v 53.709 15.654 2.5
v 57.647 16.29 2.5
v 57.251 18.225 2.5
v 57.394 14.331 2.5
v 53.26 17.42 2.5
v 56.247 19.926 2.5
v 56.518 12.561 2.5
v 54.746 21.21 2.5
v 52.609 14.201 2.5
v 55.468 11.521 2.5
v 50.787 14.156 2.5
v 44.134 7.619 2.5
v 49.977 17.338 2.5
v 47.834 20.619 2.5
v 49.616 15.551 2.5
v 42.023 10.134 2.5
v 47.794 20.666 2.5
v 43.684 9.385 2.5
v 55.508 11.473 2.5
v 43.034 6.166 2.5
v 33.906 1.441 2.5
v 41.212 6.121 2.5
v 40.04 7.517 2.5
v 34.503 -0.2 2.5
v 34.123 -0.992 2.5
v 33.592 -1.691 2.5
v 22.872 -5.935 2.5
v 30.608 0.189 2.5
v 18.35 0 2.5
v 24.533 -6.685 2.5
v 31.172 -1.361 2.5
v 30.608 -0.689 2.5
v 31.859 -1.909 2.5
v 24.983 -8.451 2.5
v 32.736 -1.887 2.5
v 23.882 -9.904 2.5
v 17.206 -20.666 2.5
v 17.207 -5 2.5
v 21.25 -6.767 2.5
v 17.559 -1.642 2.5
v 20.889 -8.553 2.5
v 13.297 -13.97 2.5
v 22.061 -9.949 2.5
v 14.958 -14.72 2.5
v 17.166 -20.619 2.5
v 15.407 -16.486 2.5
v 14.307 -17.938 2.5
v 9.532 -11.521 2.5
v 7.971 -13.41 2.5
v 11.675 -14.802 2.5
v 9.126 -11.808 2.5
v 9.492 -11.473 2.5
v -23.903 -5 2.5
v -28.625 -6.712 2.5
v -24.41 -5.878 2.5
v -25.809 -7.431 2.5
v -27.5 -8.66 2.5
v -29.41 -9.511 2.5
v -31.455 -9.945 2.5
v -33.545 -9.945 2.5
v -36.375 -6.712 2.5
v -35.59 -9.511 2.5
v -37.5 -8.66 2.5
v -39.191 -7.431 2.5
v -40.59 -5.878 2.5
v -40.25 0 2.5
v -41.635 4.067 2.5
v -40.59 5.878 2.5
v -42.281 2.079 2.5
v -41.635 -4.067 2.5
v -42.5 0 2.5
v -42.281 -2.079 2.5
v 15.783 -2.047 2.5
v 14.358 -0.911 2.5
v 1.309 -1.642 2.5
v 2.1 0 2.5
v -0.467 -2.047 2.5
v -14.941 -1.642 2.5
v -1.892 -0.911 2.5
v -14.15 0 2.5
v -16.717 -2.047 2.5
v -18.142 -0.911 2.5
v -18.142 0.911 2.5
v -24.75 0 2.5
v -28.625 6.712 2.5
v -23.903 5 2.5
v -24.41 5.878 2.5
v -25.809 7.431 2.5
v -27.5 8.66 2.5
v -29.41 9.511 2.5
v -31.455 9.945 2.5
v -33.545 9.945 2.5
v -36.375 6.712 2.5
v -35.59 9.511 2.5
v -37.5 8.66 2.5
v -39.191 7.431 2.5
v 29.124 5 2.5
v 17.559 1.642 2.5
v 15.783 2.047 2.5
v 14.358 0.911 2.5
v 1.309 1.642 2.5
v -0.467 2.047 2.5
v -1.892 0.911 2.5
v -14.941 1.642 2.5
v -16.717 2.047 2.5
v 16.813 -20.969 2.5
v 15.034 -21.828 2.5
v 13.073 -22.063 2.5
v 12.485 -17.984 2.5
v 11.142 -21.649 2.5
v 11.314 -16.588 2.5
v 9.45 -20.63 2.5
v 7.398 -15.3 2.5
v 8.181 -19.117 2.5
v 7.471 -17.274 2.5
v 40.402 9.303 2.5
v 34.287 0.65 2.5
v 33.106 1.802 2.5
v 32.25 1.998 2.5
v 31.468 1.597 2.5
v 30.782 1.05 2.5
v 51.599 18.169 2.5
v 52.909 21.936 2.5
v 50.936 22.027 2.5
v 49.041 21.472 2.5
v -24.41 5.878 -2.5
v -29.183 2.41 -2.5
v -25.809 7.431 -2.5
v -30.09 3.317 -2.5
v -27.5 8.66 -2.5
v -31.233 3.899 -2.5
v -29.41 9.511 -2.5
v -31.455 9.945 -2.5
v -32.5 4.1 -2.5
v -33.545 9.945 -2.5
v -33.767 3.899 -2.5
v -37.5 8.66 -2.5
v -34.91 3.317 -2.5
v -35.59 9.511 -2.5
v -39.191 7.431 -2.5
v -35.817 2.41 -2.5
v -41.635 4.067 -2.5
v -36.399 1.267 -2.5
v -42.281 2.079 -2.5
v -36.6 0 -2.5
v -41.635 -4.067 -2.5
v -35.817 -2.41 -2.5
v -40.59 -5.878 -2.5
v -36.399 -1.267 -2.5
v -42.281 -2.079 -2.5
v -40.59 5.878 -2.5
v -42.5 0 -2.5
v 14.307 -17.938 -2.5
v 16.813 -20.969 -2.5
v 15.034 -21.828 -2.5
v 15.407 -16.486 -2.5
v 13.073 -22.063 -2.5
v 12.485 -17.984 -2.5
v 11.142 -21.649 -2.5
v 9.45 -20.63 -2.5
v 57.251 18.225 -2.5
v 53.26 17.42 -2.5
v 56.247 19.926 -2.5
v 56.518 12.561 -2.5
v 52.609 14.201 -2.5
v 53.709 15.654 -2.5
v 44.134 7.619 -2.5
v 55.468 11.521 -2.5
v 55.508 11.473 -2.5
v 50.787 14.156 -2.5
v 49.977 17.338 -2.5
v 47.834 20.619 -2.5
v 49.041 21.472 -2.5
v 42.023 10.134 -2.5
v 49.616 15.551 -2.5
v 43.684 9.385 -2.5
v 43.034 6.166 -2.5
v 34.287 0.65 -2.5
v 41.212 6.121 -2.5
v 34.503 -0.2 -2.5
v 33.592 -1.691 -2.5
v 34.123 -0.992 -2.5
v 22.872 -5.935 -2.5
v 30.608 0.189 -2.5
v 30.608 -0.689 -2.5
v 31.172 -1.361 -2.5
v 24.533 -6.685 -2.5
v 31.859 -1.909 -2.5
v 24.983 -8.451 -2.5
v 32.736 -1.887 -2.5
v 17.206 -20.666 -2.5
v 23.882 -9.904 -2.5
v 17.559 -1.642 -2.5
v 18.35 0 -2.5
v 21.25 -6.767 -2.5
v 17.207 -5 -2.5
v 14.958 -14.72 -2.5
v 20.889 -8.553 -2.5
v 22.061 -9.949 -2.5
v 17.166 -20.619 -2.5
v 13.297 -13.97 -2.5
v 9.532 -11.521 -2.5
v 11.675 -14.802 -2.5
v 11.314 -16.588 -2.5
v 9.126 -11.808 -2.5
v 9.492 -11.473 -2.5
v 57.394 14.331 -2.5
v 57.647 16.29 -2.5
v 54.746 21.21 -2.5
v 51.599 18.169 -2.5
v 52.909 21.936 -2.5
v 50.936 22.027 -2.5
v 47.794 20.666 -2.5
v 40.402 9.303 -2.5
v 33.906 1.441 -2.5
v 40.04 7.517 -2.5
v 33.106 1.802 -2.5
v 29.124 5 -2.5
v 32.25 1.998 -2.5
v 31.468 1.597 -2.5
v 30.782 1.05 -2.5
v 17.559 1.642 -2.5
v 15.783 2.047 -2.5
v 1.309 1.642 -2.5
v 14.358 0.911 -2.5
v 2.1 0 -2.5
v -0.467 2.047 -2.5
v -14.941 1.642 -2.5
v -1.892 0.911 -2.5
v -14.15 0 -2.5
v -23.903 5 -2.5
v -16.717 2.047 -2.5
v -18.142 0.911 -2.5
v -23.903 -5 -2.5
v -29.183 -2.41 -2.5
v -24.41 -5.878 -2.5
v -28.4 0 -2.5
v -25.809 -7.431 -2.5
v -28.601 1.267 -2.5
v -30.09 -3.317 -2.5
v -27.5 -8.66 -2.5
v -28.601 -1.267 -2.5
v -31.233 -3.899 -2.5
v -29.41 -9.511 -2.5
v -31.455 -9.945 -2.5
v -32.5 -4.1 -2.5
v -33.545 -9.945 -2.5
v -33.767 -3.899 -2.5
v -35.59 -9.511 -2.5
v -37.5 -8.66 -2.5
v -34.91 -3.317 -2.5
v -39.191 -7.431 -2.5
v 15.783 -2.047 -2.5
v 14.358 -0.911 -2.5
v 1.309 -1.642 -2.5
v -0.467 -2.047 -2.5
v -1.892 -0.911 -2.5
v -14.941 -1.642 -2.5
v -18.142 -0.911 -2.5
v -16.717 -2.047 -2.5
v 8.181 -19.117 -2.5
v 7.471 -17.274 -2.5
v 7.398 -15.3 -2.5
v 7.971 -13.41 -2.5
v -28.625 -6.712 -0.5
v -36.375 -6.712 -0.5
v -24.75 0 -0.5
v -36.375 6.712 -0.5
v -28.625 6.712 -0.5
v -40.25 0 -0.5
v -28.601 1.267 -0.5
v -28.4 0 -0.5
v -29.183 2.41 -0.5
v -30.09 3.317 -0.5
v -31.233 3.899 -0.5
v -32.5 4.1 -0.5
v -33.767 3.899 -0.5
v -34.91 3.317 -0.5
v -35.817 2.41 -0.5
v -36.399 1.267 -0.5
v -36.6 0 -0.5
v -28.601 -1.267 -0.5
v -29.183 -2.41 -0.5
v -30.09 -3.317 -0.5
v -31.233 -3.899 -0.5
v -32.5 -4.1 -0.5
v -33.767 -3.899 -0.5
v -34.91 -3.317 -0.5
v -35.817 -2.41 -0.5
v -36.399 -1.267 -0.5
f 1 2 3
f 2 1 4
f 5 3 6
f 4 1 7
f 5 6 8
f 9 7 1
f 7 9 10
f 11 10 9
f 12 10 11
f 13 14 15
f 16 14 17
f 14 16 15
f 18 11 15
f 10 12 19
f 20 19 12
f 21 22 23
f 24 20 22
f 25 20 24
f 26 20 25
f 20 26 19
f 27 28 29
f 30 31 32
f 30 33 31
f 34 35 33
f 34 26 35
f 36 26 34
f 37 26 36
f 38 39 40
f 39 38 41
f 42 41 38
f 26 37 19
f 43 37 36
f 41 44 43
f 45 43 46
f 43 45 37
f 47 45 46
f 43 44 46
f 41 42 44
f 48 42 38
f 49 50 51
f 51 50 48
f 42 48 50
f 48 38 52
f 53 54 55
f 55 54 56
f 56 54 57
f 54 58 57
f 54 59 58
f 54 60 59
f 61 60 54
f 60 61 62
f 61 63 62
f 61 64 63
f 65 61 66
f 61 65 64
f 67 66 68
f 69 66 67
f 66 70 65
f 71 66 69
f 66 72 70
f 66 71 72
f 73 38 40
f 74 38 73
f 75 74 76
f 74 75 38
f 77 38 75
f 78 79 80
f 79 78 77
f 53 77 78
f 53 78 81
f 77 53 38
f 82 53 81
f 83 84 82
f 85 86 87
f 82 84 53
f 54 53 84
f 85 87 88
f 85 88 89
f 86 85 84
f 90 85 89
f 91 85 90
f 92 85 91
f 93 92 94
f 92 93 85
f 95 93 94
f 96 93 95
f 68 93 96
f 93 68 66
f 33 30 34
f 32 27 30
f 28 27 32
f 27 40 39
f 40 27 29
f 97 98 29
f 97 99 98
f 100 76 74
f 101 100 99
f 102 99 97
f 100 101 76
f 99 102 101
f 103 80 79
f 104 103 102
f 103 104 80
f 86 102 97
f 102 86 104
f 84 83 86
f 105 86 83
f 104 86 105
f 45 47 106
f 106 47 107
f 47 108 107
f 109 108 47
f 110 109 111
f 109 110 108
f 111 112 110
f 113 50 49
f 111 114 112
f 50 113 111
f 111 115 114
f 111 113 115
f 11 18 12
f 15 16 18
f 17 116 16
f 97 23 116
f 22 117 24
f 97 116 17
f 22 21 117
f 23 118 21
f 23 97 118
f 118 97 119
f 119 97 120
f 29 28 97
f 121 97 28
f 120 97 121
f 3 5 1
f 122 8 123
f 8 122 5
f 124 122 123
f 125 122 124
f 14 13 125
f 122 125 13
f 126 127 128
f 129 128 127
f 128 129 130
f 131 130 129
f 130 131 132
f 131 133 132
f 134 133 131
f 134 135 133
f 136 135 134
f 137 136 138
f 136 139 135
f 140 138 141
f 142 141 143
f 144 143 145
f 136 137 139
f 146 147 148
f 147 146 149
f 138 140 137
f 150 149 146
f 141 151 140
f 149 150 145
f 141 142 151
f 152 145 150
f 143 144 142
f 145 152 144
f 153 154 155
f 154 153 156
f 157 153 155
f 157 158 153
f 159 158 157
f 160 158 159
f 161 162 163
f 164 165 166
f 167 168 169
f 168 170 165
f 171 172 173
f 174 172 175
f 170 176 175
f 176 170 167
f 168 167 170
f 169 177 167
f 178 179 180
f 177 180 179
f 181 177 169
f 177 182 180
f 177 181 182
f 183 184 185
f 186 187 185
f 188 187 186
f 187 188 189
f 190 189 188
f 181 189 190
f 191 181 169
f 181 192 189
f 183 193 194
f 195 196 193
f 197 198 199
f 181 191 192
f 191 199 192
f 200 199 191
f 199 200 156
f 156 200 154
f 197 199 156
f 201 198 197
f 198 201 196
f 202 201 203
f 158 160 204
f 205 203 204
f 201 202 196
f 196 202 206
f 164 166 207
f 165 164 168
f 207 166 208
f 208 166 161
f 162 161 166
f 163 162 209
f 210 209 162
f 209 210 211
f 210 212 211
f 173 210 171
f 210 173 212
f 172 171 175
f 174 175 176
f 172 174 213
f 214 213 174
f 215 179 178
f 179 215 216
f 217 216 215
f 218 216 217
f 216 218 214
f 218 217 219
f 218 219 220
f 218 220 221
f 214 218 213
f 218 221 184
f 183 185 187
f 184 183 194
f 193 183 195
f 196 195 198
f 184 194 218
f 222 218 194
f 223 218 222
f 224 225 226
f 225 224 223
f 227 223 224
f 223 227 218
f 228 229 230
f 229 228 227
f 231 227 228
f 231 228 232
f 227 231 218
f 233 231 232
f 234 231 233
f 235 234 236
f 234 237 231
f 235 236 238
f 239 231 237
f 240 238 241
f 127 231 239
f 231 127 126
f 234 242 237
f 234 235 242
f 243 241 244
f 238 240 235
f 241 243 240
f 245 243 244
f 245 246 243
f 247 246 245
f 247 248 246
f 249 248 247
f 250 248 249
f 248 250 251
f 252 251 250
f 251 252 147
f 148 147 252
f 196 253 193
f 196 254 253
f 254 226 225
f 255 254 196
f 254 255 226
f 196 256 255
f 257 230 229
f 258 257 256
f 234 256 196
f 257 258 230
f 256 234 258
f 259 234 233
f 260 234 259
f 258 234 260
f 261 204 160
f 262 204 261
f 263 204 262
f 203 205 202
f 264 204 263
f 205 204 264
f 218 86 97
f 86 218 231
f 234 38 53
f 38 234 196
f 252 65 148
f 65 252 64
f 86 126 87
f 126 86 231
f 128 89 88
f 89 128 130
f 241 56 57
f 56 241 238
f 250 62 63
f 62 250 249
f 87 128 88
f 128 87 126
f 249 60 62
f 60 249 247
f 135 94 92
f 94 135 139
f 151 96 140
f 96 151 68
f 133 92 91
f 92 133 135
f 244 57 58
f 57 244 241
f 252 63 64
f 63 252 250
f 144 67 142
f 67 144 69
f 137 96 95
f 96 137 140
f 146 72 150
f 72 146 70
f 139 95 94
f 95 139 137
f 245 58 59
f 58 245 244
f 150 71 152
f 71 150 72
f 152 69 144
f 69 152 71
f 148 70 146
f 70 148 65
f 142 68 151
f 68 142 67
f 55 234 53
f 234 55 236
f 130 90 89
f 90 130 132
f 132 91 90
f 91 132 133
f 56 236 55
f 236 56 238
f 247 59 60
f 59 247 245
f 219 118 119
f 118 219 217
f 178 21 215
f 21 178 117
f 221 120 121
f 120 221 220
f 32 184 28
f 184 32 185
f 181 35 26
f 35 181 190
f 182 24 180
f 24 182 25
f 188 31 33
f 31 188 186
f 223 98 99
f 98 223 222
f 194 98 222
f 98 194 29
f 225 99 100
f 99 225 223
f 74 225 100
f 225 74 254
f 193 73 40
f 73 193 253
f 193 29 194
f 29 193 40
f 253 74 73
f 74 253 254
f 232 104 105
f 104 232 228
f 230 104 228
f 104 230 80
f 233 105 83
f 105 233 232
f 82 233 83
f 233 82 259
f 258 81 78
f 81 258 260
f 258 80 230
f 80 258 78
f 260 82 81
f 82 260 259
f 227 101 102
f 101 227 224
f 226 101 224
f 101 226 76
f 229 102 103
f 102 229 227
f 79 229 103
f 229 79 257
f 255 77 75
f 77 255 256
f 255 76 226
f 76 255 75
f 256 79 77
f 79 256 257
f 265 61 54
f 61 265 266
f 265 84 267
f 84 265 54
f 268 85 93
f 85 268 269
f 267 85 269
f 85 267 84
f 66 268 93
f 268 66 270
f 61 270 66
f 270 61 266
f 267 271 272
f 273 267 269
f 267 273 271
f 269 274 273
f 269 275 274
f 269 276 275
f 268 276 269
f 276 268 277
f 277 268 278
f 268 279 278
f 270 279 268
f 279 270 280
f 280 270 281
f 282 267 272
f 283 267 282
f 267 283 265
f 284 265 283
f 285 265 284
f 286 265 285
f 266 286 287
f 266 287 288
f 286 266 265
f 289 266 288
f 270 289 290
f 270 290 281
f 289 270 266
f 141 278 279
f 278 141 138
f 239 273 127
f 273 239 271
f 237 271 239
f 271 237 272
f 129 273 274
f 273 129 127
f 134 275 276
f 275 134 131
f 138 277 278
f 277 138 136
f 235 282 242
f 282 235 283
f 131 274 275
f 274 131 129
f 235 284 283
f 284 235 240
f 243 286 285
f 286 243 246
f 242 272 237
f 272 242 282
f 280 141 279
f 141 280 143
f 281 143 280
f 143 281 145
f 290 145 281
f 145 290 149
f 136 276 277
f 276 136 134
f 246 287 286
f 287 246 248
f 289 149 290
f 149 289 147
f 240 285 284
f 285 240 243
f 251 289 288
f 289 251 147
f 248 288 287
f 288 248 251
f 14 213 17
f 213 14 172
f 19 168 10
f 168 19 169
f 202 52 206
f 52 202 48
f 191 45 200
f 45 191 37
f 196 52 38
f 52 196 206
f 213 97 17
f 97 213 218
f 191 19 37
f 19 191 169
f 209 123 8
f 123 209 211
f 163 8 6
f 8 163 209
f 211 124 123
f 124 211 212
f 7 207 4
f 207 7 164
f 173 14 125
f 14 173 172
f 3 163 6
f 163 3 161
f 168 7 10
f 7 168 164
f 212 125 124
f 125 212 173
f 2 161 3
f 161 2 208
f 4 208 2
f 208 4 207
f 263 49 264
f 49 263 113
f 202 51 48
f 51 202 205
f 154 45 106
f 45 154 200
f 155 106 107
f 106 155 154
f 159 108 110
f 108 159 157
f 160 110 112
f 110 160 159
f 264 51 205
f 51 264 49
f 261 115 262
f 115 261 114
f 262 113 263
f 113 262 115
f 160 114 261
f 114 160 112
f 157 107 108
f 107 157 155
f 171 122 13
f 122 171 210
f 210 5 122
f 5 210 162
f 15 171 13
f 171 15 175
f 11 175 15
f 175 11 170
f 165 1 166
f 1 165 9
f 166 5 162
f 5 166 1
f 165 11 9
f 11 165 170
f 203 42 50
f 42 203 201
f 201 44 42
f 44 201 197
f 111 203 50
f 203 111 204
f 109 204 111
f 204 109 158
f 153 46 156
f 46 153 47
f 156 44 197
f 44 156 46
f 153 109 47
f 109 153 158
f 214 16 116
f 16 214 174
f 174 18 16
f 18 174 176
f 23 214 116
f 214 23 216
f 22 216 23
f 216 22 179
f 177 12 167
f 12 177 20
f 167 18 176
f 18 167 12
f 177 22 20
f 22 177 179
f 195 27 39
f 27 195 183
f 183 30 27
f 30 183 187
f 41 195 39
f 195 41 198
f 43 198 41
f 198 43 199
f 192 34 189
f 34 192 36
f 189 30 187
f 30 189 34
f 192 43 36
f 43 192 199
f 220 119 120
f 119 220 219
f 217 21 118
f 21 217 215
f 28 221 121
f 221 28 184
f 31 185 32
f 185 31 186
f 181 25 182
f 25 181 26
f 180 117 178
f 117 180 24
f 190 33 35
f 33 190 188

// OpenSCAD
espesor_pieza=5;
ancho_pieza=10;
longitud_tensor=50;
longitud_brazo=53;
longitud_brazo_suspension=50;


longitud_brazo_diagonal=sqrt(pow(longitud_brazo,2)+pow(longitud_brazo_suspension,2));
longitud_brazo_diagonal=65;

echo (longitud_brazo_diagonal);

suspension();
//brazo_diagonal();
module suspension(){
	difference(){
		union(){
			//brazo principal HORIZONTAL
			brazo_diagonal();
			
			
			translate([longitud_brazo_diagonal/2,,0])
			rotate([0,0,40])
			brazotensor();			
			
			//placa apoyo
			//translate([(-longitud_brazo+ancho_pieza*2.5)/2,-ancho_pieza*1.5,-2.5])
			//cube([20,20,5], center=true);
		}
		/*
		translate([(-longitud_brazo)/2,,0,])
			cube([20,longitud_brazo_suspension-ancho_pieza,40], center=true);
		translate([(longitud_brazo)/2,-longitud_brazo_suspension +(ancho_pieza/4),0])
			cube([20,longitud_brazo_suspension/2+ancho_pieza,40], center=true);
		
		translate([longitud_brazo_diagonal/2,0,3])
			rotate([0,0,45])
		cube([longitud_brazo_suspension-10,ancho_pieza-2 ,espesor_pieza],center=true);
		
		translate([longitud_brazo_diagonal/2,0,0])
		cylinder(r=8.2/2, h=espesor_pieza*3,$fn=20, center=true);
		*/
	}
}

module brazotensor(){
	difference(){
		union(){
			cube([longitud_tensor,ancho_pieza+2 ,espesor_pieza],center=true);
			translate([longitud_tensor/2,0,0])
			cylinder(r=ancho_pieza/2+1, h=espesor_pieza, center=true);
			translate([-longitud_tensor/2,0,0])
			cylinder(r=ancho_pieza/2+1, h=espesor_pieza, center=true);
		}
		translate([longitud_tensor/2,0,0])
		cylinder(r=4.2/2, h=20, center=true);
		translate([-longitud_tensor/2,0,0])
		cylinder(r=4.2/2, h=20, center=true);
		translate([longitud_tensor/4,0,0])
		cylinder(r=4.2/2, h=20, center=true);
		translate([-longitud_tensor/4,0,0])
		cylinder(r=4.2/2, h=20, center=true);
		cylinder(r=4.2/2, h=20, center=true);

		
	}


}



module brazo_diagonal(){
	difference(){
		union(){
			
			cube([longitud_brazo_diagonal,ancho_pieza ,espesor_pieza],center=true);
			translate([longitud_brazo_diagonal/2,0,0])
			cylinder(r=ancho_pieza/2, h=espesor_pieza, center=true);
			translate([-longitud_brazo_diagonal/2,0,0])
			cylinder(r=ancho_pieza/2, h=espesor_pieza, center=true);

			//redondeo alojamiento tuerca
			translate([-longitud_brazo_diagonal/2,0,0])
			cylinder(r=20/2, h=espesor_pieza, center=true);
			/*
			//redondeo alojamiento muelle
			translate([longitud_brazo_diagonal/2,0,0])
			cylinder(r=20/2, h=espesor_pieza, center=true);
			*/
		}
		translate([longitud_brazo_diagonal/2,0,0])
		cylinder(r=4.2/2, h=20, center=true);
		translate([-longitud_brazo_diagonal/2,0,0])
		cylinder(r=4.2/2, h=20, center=true);
		translate([longitud_brazo_diagonal/4,0,0])
		cylinder(r=4.2/2, h=20, center=true);
		translate([-longitud_brazo_diagonal/4,0,0])
		cylinder(r=4.2/2, h=20, center=true);
		cylinder(r=4.2/2, h=20, center=true);

		//ALOJAMIENTO TUERCA
		/*bulbo
		translate([-longitud_brazo_diagonal/2,0,-espesor_pieza/2])
		cylinder(r=15.5/2, h=espesor_pieza*2-2,$fn=6);
		*/
		translate([-longitud_brazo_diagonal/2,0,-espesor_pieza/2+2])
		cylinder(r=15.5/2, h=espesor_pieza*2-2,$fn=6);
		//EJE TUERCA
		
		translate([-longitud_brazo_diagonal/2,0,0])
		cylinder(r=8.2/2, h=espesor_pieza*3,$fn=20, center=true);
	}

}


//brazotensor();
